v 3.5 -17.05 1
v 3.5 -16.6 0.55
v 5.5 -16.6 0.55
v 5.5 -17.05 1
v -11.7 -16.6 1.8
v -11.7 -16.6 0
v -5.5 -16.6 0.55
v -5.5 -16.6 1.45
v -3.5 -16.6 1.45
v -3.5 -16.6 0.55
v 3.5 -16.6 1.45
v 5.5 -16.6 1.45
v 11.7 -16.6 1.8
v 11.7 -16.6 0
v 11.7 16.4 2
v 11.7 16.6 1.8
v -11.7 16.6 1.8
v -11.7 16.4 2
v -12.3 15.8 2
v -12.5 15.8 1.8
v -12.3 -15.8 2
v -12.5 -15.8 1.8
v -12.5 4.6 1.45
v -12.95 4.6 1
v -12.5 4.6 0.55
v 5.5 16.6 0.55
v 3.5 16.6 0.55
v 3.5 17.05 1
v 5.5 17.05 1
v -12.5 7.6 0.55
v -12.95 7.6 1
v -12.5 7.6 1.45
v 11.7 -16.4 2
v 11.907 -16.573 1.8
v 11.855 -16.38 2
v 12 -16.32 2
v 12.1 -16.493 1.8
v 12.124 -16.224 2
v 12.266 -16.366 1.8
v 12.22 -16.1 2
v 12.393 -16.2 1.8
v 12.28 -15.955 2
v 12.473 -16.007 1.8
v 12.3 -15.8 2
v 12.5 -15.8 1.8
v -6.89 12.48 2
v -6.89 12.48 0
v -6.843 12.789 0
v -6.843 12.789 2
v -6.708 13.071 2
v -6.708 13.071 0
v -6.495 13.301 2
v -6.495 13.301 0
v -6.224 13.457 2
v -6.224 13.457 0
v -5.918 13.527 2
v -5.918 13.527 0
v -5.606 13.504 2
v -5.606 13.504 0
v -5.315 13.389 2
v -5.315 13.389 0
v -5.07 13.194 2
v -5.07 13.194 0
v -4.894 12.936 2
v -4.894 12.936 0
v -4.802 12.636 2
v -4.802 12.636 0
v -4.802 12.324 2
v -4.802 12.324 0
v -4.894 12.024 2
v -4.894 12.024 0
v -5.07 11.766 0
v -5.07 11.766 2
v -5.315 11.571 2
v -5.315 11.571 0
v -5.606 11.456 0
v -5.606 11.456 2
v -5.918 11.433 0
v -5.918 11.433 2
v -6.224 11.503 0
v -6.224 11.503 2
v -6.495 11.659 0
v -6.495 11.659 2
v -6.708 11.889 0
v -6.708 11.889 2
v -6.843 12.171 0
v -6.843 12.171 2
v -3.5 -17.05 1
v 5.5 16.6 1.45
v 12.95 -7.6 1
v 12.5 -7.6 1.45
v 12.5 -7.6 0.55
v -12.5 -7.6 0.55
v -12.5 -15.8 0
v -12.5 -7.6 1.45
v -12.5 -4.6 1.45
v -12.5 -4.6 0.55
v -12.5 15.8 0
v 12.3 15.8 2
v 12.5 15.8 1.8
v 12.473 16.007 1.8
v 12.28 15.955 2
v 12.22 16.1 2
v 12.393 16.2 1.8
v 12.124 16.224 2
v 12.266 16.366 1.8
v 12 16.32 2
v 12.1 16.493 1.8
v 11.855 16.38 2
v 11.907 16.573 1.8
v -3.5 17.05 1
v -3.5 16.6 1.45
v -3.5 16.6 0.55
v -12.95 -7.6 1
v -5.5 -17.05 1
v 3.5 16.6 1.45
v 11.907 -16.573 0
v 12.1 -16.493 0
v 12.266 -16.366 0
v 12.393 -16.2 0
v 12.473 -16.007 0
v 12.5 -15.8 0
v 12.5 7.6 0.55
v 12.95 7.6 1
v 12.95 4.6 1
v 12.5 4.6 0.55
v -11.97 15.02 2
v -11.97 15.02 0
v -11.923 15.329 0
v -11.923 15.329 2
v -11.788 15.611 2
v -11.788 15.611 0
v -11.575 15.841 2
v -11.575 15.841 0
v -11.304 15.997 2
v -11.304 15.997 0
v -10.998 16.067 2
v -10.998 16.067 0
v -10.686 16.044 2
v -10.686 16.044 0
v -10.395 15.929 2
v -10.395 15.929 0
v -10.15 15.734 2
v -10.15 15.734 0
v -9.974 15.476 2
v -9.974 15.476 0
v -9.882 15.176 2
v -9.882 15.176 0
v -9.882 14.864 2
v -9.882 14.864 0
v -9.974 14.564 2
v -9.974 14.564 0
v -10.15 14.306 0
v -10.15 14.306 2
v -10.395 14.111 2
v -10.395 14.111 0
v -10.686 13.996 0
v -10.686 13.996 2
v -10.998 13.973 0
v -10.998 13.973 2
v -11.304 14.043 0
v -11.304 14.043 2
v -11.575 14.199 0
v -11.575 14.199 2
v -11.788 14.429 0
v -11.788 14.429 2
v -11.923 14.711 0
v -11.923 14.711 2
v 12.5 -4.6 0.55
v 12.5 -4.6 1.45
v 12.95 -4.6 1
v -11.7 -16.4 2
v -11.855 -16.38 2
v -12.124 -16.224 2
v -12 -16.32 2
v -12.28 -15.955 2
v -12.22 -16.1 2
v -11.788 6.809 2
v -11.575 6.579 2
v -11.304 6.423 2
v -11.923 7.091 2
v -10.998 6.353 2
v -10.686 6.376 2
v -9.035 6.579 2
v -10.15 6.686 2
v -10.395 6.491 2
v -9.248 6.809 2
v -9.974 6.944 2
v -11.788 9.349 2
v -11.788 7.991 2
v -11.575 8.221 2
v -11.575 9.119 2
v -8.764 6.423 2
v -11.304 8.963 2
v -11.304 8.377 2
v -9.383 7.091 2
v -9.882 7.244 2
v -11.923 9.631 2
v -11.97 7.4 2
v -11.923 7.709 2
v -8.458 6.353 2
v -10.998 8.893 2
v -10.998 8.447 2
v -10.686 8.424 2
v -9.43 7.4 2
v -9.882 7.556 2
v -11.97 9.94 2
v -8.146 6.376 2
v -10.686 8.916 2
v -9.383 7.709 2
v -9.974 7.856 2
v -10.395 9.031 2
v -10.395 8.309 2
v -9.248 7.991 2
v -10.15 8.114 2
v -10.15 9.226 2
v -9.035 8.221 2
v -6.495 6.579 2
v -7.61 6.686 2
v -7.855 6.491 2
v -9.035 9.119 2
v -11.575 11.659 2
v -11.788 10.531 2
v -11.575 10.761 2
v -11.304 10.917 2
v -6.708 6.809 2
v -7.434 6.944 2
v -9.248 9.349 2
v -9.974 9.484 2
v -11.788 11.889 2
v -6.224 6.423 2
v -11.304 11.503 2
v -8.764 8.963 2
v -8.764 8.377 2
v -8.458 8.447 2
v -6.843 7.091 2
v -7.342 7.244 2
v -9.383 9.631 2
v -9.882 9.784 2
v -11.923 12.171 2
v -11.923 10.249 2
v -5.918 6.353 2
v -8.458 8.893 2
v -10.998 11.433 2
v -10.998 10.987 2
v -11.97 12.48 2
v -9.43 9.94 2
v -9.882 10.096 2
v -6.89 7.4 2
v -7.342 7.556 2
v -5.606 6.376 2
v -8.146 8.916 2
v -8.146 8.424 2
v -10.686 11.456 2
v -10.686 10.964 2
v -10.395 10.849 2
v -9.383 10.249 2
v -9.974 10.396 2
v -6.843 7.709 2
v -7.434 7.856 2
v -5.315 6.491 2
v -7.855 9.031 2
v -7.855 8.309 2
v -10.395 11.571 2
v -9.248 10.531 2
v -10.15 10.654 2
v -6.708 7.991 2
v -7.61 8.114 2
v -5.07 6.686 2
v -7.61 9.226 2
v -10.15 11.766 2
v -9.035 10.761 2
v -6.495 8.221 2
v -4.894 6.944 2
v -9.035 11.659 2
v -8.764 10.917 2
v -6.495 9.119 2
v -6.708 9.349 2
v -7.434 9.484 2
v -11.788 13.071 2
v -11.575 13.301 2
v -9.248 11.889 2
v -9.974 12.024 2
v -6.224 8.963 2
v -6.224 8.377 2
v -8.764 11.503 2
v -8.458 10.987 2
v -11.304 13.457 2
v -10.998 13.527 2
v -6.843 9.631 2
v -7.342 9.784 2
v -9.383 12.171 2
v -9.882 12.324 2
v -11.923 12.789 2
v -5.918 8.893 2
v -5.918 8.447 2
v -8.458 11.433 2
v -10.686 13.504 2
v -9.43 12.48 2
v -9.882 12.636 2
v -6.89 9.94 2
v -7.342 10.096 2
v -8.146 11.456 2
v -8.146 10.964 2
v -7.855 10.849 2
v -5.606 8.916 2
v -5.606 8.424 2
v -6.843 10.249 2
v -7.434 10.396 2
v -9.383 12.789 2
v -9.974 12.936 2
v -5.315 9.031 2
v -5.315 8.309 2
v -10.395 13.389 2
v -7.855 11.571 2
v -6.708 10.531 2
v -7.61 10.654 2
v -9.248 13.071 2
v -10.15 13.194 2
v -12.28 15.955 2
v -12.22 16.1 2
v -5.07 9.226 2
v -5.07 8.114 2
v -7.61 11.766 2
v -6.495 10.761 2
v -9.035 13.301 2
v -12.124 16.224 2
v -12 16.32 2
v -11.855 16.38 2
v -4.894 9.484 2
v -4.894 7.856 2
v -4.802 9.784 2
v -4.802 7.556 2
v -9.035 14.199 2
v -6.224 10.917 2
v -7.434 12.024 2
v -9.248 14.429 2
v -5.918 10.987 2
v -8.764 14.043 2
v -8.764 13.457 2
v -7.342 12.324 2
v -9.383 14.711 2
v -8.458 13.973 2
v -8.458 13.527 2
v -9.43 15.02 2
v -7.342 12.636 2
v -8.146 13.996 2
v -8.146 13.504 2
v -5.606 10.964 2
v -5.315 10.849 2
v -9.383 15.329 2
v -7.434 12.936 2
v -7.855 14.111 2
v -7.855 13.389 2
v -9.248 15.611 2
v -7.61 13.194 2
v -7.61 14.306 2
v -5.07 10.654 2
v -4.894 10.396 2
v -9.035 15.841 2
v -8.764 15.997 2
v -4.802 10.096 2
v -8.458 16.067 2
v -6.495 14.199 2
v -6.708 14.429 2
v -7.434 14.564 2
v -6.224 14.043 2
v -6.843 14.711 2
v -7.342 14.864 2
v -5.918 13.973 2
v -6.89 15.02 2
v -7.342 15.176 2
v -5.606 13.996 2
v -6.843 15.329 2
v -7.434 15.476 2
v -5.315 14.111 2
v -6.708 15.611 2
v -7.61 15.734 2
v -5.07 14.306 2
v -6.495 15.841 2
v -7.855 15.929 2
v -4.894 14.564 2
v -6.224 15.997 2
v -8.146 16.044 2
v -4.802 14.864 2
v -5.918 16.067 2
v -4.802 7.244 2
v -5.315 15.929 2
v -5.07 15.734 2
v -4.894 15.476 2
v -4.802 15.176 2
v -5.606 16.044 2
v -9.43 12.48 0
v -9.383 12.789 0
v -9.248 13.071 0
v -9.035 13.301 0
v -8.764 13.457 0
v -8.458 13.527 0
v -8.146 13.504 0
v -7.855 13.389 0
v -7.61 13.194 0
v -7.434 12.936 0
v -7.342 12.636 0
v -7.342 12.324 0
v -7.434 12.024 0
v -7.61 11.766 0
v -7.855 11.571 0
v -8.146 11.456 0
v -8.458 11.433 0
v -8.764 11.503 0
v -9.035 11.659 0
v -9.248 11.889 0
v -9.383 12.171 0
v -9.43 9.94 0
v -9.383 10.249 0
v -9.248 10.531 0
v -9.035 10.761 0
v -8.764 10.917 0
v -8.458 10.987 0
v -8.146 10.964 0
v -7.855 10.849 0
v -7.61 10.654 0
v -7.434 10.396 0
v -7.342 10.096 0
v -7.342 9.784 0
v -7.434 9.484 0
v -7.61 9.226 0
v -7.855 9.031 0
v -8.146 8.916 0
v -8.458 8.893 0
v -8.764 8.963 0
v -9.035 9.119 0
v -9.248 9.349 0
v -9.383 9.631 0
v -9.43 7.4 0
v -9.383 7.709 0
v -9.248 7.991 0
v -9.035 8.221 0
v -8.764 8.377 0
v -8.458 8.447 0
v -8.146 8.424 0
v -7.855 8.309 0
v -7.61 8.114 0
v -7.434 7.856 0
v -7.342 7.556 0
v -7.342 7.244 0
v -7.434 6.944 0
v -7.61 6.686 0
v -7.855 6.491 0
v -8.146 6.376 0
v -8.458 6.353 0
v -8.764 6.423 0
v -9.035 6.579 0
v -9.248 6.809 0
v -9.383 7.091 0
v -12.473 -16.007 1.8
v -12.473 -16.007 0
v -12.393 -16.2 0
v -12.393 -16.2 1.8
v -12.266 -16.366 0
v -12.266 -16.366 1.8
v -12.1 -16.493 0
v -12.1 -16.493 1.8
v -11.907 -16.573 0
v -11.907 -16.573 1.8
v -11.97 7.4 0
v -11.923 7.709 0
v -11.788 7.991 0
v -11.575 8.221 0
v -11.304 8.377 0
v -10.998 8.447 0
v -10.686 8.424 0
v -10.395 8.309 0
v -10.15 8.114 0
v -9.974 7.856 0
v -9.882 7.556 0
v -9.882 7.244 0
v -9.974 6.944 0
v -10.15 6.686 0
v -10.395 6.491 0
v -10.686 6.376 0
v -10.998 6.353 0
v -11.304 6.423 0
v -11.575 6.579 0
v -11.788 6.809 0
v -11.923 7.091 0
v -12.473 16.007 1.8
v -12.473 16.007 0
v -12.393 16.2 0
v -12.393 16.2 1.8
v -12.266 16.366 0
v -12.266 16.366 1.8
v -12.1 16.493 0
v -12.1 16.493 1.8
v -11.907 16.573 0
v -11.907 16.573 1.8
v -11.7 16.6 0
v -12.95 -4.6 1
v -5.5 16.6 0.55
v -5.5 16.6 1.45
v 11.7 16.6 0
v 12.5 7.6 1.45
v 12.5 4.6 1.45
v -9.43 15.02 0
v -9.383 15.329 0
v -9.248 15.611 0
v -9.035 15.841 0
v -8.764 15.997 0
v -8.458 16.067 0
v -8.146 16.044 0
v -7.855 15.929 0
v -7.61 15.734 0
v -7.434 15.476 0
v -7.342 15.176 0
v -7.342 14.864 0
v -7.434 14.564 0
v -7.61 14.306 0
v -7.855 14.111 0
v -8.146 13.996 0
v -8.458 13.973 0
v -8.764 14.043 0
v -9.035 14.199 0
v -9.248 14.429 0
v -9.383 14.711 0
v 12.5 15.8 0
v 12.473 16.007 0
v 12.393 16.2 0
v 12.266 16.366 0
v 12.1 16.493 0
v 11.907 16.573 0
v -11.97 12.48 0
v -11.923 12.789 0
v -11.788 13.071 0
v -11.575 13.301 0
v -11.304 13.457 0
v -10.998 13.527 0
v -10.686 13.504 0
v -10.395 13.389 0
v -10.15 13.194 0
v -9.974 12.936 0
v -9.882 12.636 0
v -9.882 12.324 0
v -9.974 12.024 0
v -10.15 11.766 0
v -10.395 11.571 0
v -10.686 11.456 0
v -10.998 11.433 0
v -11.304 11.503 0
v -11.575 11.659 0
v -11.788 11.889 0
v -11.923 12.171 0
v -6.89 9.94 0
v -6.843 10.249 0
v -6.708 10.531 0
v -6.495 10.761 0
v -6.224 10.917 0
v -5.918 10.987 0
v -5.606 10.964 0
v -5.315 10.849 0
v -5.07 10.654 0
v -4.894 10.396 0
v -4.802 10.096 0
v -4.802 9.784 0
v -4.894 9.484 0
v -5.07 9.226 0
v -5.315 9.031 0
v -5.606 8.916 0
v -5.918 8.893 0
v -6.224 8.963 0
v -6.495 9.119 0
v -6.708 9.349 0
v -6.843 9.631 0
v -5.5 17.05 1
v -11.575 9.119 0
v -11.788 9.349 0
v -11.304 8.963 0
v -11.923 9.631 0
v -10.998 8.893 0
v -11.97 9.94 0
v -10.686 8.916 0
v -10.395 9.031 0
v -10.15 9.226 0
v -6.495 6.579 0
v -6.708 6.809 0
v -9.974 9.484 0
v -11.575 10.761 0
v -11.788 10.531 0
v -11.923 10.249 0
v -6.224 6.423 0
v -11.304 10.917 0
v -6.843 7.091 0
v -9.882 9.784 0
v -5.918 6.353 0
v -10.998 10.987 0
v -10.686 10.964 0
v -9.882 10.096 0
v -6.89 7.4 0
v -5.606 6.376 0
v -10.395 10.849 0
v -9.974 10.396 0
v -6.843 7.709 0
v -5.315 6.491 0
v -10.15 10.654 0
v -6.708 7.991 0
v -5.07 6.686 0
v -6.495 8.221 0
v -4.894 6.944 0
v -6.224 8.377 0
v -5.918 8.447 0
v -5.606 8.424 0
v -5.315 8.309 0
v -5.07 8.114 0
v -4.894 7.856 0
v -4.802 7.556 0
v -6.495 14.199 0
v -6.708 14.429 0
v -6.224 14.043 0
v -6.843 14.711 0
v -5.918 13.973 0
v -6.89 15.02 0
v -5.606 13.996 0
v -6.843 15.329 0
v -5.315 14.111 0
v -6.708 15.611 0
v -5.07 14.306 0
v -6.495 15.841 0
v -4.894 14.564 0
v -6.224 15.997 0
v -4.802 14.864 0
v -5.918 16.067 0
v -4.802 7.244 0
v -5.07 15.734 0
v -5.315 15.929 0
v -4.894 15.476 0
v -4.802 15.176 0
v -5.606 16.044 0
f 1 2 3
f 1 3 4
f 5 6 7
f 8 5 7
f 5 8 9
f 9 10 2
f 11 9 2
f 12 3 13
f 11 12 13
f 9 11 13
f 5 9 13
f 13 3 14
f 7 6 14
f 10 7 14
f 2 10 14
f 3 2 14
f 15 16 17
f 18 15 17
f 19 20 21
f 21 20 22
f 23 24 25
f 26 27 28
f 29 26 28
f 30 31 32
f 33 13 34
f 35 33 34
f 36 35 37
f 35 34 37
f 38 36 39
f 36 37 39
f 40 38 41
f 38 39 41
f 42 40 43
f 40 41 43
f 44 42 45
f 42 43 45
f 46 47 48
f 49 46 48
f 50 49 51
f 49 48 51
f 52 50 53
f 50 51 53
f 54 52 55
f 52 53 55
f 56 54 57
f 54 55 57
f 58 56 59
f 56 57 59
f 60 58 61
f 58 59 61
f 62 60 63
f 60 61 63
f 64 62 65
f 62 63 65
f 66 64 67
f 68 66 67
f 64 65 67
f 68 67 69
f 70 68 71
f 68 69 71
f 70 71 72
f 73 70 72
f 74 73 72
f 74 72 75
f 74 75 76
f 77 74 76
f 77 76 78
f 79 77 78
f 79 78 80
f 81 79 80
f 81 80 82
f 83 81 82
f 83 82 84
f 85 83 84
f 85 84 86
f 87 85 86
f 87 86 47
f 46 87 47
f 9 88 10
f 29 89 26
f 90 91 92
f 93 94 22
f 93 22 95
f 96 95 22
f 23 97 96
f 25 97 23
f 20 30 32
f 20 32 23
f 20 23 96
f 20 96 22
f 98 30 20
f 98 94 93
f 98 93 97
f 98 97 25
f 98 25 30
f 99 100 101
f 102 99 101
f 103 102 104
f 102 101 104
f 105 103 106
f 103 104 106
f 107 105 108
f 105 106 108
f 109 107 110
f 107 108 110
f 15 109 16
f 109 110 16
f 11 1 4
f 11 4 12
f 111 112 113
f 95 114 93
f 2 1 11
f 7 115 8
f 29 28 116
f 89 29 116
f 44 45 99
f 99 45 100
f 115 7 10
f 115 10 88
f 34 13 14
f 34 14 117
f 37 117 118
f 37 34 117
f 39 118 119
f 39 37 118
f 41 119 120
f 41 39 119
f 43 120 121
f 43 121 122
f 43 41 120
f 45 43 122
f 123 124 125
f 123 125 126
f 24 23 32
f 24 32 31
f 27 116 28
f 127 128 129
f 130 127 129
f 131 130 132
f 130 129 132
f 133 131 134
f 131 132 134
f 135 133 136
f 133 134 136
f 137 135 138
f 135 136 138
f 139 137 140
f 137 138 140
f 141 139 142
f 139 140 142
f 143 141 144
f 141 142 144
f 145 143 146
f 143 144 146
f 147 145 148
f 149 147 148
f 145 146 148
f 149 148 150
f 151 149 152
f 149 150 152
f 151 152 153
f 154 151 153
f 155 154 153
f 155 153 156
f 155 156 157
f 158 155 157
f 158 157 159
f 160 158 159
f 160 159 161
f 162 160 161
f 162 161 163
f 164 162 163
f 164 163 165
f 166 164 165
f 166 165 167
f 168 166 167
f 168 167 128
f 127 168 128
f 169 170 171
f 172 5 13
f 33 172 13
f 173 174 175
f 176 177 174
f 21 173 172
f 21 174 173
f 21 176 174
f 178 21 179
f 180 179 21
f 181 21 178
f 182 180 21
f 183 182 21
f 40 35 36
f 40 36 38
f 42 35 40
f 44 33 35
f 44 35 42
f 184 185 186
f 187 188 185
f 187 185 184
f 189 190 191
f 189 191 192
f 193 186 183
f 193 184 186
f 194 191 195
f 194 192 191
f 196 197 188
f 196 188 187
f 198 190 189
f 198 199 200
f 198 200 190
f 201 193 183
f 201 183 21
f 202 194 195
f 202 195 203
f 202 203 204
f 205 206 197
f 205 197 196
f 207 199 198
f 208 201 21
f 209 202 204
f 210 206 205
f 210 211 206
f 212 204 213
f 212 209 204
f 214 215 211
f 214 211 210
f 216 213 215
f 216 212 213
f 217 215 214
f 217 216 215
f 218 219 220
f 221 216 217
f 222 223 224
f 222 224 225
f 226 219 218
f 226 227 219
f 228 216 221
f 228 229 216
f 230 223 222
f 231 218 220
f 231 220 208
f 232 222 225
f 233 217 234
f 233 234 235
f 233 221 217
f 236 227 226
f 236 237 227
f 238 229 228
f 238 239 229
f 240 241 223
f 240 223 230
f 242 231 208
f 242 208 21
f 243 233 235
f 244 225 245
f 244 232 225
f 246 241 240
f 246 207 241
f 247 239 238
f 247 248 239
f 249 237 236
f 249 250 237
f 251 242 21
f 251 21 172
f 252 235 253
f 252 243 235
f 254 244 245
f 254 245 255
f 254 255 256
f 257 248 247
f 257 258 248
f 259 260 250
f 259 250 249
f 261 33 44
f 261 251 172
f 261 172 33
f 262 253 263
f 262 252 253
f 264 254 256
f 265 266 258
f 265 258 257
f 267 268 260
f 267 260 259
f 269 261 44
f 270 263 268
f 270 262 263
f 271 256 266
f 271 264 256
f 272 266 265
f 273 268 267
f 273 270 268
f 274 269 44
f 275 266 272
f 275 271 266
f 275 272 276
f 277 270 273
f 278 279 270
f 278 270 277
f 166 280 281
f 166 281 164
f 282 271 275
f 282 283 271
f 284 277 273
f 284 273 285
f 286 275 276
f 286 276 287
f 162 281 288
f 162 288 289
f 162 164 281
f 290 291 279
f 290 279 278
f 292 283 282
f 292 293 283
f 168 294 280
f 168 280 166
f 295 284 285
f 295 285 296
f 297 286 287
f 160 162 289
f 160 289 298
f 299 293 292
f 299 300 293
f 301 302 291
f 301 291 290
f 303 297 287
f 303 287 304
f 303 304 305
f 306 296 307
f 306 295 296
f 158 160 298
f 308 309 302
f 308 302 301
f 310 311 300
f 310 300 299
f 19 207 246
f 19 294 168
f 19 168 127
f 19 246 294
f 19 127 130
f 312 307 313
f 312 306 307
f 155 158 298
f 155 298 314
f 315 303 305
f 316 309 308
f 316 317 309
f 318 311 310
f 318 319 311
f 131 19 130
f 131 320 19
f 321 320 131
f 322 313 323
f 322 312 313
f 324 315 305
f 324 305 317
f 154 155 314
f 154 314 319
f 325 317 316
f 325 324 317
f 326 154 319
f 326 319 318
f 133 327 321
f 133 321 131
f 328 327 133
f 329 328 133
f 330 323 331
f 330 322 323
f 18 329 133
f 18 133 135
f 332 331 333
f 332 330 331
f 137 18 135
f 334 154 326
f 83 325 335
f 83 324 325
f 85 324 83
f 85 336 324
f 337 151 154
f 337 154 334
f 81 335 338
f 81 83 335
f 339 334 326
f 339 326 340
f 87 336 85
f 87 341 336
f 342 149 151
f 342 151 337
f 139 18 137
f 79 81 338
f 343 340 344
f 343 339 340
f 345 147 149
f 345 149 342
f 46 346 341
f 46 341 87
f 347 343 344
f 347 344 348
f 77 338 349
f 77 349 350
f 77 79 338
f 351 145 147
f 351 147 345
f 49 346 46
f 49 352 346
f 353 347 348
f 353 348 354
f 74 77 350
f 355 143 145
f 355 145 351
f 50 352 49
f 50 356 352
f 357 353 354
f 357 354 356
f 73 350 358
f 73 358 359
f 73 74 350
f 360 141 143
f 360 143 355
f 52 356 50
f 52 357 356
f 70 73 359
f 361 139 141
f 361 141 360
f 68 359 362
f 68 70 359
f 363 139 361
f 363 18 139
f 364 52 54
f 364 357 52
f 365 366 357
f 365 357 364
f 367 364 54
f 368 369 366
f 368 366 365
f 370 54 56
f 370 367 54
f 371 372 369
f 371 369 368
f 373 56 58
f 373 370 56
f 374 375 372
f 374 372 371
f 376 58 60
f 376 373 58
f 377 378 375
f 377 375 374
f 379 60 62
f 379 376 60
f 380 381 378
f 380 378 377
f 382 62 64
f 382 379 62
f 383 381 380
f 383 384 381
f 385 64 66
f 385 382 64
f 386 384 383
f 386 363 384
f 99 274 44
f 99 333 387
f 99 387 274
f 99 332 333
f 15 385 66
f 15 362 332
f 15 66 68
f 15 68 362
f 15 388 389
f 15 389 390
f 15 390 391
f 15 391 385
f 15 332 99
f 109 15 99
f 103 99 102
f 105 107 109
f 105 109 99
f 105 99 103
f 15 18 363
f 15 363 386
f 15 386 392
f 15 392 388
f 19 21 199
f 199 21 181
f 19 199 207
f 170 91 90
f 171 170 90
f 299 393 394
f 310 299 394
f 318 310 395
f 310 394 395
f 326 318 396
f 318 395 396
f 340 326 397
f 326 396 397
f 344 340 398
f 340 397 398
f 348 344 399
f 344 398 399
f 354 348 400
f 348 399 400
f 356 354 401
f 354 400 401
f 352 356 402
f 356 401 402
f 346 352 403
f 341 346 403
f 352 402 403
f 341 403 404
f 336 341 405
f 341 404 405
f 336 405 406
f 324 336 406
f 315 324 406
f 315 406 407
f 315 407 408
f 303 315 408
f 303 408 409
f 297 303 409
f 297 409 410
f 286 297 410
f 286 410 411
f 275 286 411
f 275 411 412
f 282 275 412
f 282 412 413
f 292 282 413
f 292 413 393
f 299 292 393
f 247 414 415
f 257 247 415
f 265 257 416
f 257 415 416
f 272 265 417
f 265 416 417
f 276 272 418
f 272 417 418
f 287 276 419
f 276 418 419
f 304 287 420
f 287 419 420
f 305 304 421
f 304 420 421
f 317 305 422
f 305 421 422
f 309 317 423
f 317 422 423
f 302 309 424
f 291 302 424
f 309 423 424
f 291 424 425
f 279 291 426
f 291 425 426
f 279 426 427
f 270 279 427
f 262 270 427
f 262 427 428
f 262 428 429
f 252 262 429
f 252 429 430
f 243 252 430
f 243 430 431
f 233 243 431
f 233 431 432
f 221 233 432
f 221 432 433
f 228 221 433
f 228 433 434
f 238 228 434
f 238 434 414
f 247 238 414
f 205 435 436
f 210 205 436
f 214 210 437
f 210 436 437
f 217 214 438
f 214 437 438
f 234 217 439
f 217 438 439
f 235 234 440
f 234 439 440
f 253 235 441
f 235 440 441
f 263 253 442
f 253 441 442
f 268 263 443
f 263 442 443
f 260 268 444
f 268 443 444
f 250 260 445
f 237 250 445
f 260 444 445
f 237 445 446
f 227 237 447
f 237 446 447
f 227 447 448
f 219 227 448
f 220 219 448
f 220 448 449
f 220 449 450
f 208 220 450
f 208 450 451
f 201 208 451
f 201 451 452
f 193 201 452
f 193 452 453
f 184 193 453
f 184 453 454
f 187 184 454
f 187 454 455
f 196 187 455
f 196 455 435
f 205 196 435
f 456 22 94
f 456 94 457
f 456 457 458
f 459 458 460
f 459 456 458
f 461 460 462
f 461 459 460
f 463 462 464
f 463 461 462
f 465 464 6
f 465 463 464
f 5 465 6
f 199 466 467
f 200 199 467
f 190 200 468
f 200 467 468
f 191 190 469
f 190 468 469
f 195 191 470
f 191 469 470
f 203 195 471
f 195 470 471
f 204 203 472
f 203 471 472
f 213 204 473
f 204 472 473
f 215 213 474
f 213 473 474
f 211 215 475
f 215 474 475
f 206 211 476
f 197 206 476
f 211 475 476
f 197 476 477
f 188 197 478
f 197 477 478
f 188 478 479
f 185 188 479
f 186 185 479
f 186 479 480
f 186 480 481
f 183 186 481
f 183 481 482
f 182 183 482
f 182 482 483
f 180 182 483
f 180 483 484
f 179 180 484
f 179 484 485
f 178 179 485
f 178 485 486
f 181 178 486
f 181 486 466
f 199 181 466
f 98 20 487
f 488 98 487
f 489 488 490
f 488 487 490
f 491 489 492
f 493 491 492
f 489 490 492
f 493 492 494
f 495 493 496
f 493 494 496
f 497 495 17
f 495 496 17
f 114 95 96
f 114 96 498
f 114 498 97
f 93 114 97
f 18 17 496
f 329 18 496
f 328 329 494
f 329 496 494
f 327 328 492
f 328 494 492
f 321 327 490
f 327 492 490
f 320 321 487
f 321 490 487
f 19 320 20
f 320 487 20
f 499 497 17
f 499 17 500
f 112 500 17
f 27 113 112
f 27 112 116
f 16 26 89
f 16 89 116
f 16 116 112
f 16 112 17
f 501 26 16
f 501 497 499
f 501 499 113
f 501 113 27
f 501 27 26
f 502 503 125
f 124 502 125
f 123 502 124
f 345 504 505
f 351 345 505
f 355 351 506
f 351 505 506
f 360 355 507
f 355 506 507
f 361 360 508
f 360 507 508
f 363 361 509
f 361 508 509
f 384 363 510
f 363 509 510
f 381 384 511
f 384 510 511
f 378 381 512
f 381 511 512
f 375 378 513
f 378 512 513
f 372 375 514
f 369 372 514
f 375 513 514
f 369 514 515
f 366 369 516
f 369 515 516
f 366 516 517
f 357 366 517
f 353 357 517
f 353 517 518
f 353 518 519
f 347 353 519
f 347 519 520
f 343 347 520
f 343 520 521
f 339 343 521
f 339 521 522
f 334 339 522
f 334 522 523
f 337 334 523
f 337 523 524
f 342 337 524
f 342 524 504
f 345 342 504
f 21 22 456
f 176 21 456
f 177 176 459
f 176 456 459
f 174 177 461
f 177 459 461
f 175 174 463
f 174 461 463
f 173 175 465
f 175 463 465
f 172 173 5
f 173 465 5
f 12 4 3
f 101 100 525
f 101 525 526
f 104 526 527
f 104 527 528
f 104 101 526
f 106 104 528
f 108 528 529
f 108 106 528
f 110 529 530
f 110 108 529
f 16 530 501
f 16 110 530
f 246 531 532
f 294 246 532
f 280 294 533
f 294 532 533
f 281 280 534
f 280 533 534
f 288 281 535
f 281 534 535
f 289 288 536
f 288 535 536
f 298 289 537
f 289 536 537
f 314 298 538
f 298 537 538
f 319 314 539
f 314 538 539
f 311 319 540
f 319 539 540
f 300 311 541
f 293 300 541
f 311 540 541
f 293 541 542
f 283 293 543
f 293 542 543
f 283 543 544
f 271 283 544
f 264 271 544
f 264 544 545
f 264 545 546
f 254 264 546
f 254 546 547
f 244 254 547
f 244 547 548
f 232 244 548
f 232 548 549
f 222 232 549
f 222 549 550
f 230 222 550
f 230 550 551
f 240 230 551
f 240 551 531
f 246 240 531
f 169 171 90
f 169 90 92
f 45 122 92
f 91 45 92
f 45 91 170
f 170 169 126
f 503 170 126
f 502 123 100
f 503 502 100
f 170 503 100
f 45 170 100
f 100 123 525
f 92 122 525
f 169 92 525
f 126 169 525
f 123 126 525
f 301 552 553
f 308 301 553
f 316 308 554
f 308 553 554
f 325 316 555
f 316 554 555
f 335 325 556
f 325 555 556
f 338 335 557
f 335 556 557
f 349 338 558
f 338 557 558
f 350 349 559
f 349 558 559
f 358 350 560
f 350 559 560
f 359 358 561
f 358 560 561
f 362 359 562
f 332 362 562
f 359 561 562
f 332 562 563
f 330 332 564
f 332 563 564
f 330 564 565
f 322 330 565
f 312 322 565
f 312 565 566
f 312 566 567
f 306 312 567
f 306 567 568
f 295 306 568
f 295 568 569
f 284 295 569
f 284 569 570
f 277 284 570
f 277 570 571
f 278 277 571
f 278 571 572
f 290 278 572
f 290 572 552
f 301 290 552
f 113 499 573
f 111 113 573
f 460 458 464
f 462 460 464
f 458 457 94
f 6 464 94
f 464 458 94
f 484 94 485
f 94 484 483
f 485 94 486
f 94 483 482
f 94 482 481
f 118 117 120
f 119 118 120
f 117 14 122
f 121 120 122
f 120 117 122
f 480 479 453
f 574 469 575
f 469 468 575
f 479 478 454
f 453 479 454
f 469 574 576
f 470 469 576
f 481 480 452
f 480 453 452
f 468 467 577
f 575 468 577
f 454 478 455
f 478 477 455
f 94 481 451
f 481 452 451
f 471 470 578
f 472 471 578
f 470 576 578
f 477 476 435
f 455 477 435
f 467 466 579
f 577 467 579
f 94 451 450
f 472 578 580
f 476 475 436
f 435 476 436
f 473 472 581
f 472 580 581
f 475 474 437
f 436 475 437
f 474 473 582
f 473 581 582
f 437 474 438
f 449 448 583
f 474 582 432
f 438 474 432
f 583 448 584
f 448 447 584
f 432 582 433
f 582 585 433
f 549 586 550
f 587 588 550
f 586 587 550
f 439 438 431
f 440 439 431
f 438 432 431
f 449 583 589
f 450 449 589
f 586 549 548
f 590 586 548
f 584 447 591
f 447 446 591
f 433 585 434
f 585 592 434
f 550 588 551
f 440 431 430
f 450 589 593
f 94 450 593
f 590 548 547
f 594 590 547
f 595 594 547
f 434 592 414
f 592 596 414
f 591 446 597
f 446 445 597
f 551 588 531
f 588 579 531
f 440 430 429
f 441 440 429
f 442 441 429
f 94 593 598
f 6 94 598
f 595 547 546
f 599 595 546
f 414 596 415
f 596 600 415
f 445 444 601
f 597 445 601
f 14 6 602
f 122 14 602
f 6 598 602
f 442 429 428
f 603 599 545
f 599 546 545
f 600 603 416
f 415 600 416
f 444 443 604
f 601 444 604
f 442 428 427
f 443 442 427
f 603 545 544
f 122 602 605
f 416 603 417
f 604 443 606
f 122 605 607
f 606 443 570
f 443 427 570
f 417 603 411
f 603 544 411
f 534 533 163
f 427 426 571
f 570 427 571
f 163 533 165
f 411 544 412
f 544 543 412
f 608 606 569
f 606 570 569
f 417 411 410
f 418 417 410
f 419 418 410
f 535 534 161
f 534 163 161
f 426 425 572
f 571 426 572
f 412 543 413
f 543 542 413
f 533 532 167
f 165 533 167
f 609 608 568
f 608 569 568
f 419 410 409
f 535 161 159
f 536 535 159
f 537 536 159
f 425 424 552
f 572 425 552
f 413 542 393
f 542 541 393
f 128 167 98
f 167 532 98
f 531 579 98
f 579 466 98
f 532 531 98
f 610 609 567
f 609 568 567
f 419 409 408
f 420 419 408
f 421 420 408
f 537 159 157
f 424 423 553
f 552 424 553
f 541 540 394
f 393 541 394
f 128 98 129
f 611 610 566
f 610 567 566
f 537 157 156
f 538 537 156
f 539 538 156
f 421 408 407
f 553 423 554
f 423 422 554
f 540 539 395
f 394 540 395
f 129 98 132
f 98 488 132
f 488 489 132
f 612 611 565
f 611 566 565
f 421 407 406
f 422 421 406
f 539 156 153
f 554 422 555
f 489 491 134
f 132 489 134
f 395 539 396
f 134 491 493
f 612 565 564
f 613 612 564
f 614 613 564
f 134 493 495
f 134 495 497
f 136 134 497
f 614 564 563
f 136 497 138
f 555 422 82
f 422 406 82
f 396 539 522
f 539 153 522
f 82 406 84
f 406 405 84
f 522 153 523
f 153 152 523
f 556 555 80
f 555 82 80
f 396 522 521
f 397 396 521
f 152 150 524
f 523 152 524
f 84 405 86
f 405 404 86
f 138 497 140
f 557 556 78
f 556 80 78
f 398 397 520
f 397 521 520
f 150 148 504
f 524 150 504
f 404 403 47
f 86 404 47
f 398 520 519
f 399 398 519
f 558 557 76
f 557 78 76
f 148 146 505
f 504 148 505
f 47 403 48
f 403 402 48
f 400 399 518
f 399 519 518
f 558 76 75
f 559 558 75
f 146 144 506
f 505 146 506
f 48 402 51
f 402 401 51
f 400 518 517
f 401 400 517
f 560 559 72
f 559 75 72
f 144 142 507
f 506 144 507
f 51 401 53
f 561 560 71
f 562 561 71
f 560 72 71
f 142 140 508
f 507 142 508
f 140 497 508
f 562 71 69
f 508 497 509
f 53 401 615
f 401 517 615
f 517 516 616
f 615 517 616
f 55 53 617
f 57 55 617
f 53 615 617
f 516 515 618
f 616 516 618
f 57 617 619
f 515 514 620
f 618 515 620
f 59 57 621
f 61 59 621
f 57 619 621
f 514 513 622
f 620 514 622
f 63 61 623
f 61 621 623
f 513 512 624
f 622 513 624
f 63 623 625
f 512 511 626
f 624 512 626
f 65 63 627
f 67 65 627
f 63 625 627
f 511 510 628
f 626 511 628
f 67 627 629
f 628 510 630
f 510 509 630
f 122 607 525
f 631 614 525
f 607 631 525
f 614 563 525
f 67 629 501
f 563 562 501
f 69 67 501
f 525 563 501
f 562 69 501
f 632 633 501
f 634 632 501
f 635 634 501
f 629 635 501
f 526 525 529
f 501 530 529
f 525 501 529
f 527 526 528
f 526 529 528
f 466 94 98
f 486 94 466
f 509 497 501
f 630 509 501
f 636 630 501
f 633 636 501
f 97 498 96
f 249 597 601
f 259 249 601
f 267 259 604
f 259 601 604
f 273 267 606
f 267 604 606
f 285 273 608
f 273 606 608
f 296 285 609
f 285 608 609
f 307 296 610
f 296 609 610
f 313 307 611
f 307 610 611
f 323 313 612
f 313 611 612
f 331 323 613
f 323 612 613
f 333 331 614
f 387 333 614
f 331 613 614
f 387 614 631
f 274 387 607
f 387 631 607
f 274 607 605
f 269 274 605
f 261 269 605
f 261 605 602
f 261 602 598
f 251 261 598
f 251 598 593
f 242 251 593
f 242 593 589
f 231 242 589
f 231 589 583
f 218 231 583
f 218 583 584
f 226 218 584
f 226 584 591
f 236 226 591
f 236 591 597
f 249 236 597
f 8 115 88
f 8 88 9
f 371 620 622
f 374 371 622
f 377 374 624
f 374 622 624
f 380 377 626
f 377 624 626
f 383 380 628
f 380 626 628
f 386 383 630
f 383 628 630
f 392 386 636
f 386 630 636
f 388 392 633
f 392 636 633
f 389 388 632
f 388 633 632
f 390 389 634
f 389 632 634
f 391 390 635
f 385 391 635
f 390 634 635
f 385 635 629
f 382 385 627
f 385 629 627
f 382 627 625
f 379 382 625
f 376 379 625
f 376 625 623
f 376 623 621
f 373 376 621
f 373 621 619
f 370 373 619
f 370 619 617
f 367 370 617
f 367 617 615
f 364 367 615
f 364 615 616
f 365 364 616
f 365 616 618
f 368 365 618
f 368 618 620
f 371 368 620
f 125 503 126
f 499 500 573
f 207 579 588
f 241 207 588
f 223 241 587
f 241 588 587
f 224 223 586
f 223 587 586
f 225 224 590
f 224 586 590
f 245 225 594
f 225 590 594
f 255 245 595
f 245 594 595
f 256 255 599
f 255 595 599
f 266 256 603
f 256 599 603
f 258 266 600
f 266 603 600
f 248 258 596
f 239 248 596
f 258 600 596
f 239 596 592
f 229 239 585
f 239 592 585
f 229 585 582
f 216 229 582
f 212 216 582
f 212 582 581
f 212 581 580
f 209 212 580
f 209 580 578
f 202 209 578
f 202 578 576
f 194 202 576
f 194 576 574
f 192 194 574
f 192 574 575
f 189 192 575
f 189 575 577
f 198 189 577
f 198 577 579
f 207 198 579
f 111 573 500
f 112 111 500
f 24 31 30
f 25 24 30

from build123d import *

# Parameters (mm, degrees)
SKETCH_1_W               = 25
SKETCH_1_H               = 33.2
EXTRUDE_1_DEPTH          = 2
FILLET_1_R               = 0.8
CHAMFER_1_SIZE           = 0.2
SKETCH_3_R               = 1.05
CUT_EXTRUDE_2_DEPTH      = 21.876062847
EXTRUDE_2_REACH          = 37.532
CUT_EXTRUDE_3_DEPTH      = 22.148581513
CUT_EXTRUDE_3_DEPTH_BACK = 22.148581513
SKETCH_5_W               = 0.45
SKETCH_5_H               = 9
SKETCH_5_H_2             = 9.2
EXTRUDE_START            = -25
EXTRUDE_3_DEPTH          = 25
CUT_EXTRUDE_4_DEPTH      = 22.503604349
CUT_EXTRUDE_4_DEPTH_BACK = 22.503604349
SKETCH_7_W               = 7
SKETCH_7_H               = 0.45


with BuildPart() as part:
    # 草图1 → 凸台-拉伸1 (new body)
    with BuildSketch(Plane.XY):
        Rectangle(SKETCH_1_W, SKETCH_1_H)
    extrude(amount=EXTRUDE_1_DEPTH)

    # 圆角1
    fillet_1_edges = [part.edges().sort_by_distance(p)[0] for p in [
        (-12.5, 16.6, 1),
        (12.5, 16.6, 1),
        (12.5, -16.6, 1),
        (-12.5, -16.6, 1),
    ]]
    fillet(fillet_1_edges, radius=FILLET_1_R)

    # 倒角1
    chamfer_1_edges = [part.edges().sort_by_distance(p)[0] for p in [
        (12.5, 0, 2),
        (0, -16.6, 2),
        (-12.5, 0, 2),
        (0, 16.6, 2),
        (12.265685425, 16.365685425, 2),
        (-12.265685425, 16.365685425, 2),
        (-12.265685425, -16.365685425, 2),
        (12.265685425, -16.365685425, 2),
    ]]
    chamfer(chamfer_1_edges, length=CHAMFER_1_SIZE)

    # 草图3 → 切除-拉伸2 (cut, through all)
    with BuildSketch(Plane(origin=(0, 0, 0), x_dir=(-1, 0, 0), z_dir=(0, 0, -1))):
        with Locations((10.92, 15.02)):
            Circle(SKETCH_3_R)
        with Locations((8.38, 15.02)):
            Circle(SKETCH_3_R)
        with Locations((5.84, 15.02)):
            Circle(SKETCH_3_R)
        with Locations((8.38, 12.48)):
            Circle(SKETCH_3_R)
        with Locations((5.84, 12.48)):
            Circle(SKETCH_3_R)
        with Locations((8.38, 9.94)):
            Circle(SKETCH_3_R)
        with Locations((5.84, 9.94)):
            Circle(SKETCH_3_R)
        with Locations((8.38, 7.4)):
            Circle(SKETCH_3_R)
        with Locations((5.84, 7.4)):
            Circle(SKETCH_3_R)
        with Locations((10.92, 12.48)):
            Circle(SKETCH_3_R)
        with Locations((10.92, 9.94)):
            Circle(SKETCH_3_R)
        with Locations((10.92, 7.4)):
            Circle(SKETCH_3_R)
    extrude(amount=-CUT_EXTRUDE_2_DEPTH, mode=Mode.SUBTRACT)

    # 凸台-拉伸2: up to this face of the body (flat: up to its plane)
    extrude_2_end = Plane(part.part.faces().sort_by_distance((0, 16.6, 0.9))[0])
    # 草图4 → 凸台-拉伸2 (add, up to the picked face)
    with BuildSketch(Plane.XZ.offset(16.6), mode=Mode.PRIVATE) as extrude_2_sk1:
        Polygon((12.5, 1.45), (12.95, 1), (12.5, 0.55), align=None)
    extrude_2_tool1 = split(extrude(extrude_2_sk1.sketch, amount=-EXTRUDE_2_REACH, mode=Mode.PRIVATE), bisect_by=extrude_2_end, keep=Keep.BOTH, mode=Mode.PRIVATE)
    # 草图4 → 凸台-拉伸2 (add, up to the picked face)
    with BuildSketch(Plane.XZ.offset(16.6), mode=Mode.PRIVATE) as extrude_2_sk2:
        Polygon((-12.5, 1.45), (-12.95, 1), (-12.5, 0.55), align=None)
    extrude_2_tool2 = split(extrude(extrude_2_sk2.sketch, amount=-EXTRUDE_2_REACH, mode=Mode.PRIVATE), bisect_by=extrude_2_end, keep=Keep.BOTH, mode=Mode.PRIVATE)
    add(extrude_2_tool1.solids().sort_by(Axis((12.65, -16.6, 1), (0, 1, 0)))[0])
    add(extrude_2_tool2.solids().sort_by(Axis((-12.65, -16.6, 1), (0, 1, 0)))[0])

    # 草图5 → 切除-拉伸3 (cut, two sides: drawn at the far end of the back side and taken through both)
    with BuildSketch(Plane.XY.offset(2).offset(-CUT_EXTRUDE_3_DEPTH_BACK)):
        with Locations((-12.725, 12.1)):
            Rectangle(SKETCH_5_W, SKETCH_5_H)
        with Locations((-12.725, 0)):
            Rectangle(SKETCH_5_W, SKETCH_5_H_2)
        with Locations((-12.725, -12.1)):
            Rectangle(SKETCH_5_W, SKETCH_5_H)
        with Locations((12.725, -12.1)):
            Rectangle(SKETCH_5_W, SKETCH_5_H)
        with Locations((12.725, 0)):
            Rectangle(SKETCH_5_W, SKETCH_5_H_2)
        with Locations((12.725, 12.1)):
            Rectangle(SKETCH_5_W, SKETCH_5_H)
    extrude(amount=CUT_EXTRUDE_3_DEPTH + CUT_EXTRUDE_3_DEPTH_BACK, mode=Mode.SUBTRACT)

    # 草图6 → 凸台-拉伸3 (add)
    with BuildSketch(Plane(origin=(12.5, 0, 0), x_dir=(0, 0, -1), z_dir=(1, 0, 0)).offset(EXTRUDE_START)):
        Polygon((-1.45, 16.6), (-0.55, 16.6), (-1, 17.05), align=None)
        Polygon((-0.55, -16.6), (-1, -17.05), (-1.45, -16.6), align=None)
    extrude(amount=EXTRUDE_3_DEPTH)

    # 草图7 → 切除-拉伸4 (cut, two sides: drawn at the far end of the back side and taken through both)
    with BuildSketch(Plane.XY.offset(2).offset(-CUT_EXTRUDE_4_DEPTH_BACK)):
        with Locations((-9, 16.825)):
            Rectangle(SKETCH_7_W, SKETCH_7_H)
        with Locations((0, 16.825)):
            Rectangle(SKETCH_7_W, SKETCH_7_H)
        with Locations((9, -16.825)):
            Rectangle(SKETCH_7_W, SKETCH_7_H)
        with Locations((9, 16.825)):
            Rectangle(SKETCH_7_W, SKETCH_7_H)
        with Locations((0, -16.825)):
            Rectangle(SKETCH_7_W, SKETCH_7_H)
        with Locations((-9, -16.825)):
            Rectangle(SKETCH_7_W, SKETCH_7_H)
    extrude(amount=CUT_EXTRUDE_4_DEPTH + CUT_EXTRUDE_4_DEPTH_BACK, mode=Mode.SUBTRACT)


solid = part.part
